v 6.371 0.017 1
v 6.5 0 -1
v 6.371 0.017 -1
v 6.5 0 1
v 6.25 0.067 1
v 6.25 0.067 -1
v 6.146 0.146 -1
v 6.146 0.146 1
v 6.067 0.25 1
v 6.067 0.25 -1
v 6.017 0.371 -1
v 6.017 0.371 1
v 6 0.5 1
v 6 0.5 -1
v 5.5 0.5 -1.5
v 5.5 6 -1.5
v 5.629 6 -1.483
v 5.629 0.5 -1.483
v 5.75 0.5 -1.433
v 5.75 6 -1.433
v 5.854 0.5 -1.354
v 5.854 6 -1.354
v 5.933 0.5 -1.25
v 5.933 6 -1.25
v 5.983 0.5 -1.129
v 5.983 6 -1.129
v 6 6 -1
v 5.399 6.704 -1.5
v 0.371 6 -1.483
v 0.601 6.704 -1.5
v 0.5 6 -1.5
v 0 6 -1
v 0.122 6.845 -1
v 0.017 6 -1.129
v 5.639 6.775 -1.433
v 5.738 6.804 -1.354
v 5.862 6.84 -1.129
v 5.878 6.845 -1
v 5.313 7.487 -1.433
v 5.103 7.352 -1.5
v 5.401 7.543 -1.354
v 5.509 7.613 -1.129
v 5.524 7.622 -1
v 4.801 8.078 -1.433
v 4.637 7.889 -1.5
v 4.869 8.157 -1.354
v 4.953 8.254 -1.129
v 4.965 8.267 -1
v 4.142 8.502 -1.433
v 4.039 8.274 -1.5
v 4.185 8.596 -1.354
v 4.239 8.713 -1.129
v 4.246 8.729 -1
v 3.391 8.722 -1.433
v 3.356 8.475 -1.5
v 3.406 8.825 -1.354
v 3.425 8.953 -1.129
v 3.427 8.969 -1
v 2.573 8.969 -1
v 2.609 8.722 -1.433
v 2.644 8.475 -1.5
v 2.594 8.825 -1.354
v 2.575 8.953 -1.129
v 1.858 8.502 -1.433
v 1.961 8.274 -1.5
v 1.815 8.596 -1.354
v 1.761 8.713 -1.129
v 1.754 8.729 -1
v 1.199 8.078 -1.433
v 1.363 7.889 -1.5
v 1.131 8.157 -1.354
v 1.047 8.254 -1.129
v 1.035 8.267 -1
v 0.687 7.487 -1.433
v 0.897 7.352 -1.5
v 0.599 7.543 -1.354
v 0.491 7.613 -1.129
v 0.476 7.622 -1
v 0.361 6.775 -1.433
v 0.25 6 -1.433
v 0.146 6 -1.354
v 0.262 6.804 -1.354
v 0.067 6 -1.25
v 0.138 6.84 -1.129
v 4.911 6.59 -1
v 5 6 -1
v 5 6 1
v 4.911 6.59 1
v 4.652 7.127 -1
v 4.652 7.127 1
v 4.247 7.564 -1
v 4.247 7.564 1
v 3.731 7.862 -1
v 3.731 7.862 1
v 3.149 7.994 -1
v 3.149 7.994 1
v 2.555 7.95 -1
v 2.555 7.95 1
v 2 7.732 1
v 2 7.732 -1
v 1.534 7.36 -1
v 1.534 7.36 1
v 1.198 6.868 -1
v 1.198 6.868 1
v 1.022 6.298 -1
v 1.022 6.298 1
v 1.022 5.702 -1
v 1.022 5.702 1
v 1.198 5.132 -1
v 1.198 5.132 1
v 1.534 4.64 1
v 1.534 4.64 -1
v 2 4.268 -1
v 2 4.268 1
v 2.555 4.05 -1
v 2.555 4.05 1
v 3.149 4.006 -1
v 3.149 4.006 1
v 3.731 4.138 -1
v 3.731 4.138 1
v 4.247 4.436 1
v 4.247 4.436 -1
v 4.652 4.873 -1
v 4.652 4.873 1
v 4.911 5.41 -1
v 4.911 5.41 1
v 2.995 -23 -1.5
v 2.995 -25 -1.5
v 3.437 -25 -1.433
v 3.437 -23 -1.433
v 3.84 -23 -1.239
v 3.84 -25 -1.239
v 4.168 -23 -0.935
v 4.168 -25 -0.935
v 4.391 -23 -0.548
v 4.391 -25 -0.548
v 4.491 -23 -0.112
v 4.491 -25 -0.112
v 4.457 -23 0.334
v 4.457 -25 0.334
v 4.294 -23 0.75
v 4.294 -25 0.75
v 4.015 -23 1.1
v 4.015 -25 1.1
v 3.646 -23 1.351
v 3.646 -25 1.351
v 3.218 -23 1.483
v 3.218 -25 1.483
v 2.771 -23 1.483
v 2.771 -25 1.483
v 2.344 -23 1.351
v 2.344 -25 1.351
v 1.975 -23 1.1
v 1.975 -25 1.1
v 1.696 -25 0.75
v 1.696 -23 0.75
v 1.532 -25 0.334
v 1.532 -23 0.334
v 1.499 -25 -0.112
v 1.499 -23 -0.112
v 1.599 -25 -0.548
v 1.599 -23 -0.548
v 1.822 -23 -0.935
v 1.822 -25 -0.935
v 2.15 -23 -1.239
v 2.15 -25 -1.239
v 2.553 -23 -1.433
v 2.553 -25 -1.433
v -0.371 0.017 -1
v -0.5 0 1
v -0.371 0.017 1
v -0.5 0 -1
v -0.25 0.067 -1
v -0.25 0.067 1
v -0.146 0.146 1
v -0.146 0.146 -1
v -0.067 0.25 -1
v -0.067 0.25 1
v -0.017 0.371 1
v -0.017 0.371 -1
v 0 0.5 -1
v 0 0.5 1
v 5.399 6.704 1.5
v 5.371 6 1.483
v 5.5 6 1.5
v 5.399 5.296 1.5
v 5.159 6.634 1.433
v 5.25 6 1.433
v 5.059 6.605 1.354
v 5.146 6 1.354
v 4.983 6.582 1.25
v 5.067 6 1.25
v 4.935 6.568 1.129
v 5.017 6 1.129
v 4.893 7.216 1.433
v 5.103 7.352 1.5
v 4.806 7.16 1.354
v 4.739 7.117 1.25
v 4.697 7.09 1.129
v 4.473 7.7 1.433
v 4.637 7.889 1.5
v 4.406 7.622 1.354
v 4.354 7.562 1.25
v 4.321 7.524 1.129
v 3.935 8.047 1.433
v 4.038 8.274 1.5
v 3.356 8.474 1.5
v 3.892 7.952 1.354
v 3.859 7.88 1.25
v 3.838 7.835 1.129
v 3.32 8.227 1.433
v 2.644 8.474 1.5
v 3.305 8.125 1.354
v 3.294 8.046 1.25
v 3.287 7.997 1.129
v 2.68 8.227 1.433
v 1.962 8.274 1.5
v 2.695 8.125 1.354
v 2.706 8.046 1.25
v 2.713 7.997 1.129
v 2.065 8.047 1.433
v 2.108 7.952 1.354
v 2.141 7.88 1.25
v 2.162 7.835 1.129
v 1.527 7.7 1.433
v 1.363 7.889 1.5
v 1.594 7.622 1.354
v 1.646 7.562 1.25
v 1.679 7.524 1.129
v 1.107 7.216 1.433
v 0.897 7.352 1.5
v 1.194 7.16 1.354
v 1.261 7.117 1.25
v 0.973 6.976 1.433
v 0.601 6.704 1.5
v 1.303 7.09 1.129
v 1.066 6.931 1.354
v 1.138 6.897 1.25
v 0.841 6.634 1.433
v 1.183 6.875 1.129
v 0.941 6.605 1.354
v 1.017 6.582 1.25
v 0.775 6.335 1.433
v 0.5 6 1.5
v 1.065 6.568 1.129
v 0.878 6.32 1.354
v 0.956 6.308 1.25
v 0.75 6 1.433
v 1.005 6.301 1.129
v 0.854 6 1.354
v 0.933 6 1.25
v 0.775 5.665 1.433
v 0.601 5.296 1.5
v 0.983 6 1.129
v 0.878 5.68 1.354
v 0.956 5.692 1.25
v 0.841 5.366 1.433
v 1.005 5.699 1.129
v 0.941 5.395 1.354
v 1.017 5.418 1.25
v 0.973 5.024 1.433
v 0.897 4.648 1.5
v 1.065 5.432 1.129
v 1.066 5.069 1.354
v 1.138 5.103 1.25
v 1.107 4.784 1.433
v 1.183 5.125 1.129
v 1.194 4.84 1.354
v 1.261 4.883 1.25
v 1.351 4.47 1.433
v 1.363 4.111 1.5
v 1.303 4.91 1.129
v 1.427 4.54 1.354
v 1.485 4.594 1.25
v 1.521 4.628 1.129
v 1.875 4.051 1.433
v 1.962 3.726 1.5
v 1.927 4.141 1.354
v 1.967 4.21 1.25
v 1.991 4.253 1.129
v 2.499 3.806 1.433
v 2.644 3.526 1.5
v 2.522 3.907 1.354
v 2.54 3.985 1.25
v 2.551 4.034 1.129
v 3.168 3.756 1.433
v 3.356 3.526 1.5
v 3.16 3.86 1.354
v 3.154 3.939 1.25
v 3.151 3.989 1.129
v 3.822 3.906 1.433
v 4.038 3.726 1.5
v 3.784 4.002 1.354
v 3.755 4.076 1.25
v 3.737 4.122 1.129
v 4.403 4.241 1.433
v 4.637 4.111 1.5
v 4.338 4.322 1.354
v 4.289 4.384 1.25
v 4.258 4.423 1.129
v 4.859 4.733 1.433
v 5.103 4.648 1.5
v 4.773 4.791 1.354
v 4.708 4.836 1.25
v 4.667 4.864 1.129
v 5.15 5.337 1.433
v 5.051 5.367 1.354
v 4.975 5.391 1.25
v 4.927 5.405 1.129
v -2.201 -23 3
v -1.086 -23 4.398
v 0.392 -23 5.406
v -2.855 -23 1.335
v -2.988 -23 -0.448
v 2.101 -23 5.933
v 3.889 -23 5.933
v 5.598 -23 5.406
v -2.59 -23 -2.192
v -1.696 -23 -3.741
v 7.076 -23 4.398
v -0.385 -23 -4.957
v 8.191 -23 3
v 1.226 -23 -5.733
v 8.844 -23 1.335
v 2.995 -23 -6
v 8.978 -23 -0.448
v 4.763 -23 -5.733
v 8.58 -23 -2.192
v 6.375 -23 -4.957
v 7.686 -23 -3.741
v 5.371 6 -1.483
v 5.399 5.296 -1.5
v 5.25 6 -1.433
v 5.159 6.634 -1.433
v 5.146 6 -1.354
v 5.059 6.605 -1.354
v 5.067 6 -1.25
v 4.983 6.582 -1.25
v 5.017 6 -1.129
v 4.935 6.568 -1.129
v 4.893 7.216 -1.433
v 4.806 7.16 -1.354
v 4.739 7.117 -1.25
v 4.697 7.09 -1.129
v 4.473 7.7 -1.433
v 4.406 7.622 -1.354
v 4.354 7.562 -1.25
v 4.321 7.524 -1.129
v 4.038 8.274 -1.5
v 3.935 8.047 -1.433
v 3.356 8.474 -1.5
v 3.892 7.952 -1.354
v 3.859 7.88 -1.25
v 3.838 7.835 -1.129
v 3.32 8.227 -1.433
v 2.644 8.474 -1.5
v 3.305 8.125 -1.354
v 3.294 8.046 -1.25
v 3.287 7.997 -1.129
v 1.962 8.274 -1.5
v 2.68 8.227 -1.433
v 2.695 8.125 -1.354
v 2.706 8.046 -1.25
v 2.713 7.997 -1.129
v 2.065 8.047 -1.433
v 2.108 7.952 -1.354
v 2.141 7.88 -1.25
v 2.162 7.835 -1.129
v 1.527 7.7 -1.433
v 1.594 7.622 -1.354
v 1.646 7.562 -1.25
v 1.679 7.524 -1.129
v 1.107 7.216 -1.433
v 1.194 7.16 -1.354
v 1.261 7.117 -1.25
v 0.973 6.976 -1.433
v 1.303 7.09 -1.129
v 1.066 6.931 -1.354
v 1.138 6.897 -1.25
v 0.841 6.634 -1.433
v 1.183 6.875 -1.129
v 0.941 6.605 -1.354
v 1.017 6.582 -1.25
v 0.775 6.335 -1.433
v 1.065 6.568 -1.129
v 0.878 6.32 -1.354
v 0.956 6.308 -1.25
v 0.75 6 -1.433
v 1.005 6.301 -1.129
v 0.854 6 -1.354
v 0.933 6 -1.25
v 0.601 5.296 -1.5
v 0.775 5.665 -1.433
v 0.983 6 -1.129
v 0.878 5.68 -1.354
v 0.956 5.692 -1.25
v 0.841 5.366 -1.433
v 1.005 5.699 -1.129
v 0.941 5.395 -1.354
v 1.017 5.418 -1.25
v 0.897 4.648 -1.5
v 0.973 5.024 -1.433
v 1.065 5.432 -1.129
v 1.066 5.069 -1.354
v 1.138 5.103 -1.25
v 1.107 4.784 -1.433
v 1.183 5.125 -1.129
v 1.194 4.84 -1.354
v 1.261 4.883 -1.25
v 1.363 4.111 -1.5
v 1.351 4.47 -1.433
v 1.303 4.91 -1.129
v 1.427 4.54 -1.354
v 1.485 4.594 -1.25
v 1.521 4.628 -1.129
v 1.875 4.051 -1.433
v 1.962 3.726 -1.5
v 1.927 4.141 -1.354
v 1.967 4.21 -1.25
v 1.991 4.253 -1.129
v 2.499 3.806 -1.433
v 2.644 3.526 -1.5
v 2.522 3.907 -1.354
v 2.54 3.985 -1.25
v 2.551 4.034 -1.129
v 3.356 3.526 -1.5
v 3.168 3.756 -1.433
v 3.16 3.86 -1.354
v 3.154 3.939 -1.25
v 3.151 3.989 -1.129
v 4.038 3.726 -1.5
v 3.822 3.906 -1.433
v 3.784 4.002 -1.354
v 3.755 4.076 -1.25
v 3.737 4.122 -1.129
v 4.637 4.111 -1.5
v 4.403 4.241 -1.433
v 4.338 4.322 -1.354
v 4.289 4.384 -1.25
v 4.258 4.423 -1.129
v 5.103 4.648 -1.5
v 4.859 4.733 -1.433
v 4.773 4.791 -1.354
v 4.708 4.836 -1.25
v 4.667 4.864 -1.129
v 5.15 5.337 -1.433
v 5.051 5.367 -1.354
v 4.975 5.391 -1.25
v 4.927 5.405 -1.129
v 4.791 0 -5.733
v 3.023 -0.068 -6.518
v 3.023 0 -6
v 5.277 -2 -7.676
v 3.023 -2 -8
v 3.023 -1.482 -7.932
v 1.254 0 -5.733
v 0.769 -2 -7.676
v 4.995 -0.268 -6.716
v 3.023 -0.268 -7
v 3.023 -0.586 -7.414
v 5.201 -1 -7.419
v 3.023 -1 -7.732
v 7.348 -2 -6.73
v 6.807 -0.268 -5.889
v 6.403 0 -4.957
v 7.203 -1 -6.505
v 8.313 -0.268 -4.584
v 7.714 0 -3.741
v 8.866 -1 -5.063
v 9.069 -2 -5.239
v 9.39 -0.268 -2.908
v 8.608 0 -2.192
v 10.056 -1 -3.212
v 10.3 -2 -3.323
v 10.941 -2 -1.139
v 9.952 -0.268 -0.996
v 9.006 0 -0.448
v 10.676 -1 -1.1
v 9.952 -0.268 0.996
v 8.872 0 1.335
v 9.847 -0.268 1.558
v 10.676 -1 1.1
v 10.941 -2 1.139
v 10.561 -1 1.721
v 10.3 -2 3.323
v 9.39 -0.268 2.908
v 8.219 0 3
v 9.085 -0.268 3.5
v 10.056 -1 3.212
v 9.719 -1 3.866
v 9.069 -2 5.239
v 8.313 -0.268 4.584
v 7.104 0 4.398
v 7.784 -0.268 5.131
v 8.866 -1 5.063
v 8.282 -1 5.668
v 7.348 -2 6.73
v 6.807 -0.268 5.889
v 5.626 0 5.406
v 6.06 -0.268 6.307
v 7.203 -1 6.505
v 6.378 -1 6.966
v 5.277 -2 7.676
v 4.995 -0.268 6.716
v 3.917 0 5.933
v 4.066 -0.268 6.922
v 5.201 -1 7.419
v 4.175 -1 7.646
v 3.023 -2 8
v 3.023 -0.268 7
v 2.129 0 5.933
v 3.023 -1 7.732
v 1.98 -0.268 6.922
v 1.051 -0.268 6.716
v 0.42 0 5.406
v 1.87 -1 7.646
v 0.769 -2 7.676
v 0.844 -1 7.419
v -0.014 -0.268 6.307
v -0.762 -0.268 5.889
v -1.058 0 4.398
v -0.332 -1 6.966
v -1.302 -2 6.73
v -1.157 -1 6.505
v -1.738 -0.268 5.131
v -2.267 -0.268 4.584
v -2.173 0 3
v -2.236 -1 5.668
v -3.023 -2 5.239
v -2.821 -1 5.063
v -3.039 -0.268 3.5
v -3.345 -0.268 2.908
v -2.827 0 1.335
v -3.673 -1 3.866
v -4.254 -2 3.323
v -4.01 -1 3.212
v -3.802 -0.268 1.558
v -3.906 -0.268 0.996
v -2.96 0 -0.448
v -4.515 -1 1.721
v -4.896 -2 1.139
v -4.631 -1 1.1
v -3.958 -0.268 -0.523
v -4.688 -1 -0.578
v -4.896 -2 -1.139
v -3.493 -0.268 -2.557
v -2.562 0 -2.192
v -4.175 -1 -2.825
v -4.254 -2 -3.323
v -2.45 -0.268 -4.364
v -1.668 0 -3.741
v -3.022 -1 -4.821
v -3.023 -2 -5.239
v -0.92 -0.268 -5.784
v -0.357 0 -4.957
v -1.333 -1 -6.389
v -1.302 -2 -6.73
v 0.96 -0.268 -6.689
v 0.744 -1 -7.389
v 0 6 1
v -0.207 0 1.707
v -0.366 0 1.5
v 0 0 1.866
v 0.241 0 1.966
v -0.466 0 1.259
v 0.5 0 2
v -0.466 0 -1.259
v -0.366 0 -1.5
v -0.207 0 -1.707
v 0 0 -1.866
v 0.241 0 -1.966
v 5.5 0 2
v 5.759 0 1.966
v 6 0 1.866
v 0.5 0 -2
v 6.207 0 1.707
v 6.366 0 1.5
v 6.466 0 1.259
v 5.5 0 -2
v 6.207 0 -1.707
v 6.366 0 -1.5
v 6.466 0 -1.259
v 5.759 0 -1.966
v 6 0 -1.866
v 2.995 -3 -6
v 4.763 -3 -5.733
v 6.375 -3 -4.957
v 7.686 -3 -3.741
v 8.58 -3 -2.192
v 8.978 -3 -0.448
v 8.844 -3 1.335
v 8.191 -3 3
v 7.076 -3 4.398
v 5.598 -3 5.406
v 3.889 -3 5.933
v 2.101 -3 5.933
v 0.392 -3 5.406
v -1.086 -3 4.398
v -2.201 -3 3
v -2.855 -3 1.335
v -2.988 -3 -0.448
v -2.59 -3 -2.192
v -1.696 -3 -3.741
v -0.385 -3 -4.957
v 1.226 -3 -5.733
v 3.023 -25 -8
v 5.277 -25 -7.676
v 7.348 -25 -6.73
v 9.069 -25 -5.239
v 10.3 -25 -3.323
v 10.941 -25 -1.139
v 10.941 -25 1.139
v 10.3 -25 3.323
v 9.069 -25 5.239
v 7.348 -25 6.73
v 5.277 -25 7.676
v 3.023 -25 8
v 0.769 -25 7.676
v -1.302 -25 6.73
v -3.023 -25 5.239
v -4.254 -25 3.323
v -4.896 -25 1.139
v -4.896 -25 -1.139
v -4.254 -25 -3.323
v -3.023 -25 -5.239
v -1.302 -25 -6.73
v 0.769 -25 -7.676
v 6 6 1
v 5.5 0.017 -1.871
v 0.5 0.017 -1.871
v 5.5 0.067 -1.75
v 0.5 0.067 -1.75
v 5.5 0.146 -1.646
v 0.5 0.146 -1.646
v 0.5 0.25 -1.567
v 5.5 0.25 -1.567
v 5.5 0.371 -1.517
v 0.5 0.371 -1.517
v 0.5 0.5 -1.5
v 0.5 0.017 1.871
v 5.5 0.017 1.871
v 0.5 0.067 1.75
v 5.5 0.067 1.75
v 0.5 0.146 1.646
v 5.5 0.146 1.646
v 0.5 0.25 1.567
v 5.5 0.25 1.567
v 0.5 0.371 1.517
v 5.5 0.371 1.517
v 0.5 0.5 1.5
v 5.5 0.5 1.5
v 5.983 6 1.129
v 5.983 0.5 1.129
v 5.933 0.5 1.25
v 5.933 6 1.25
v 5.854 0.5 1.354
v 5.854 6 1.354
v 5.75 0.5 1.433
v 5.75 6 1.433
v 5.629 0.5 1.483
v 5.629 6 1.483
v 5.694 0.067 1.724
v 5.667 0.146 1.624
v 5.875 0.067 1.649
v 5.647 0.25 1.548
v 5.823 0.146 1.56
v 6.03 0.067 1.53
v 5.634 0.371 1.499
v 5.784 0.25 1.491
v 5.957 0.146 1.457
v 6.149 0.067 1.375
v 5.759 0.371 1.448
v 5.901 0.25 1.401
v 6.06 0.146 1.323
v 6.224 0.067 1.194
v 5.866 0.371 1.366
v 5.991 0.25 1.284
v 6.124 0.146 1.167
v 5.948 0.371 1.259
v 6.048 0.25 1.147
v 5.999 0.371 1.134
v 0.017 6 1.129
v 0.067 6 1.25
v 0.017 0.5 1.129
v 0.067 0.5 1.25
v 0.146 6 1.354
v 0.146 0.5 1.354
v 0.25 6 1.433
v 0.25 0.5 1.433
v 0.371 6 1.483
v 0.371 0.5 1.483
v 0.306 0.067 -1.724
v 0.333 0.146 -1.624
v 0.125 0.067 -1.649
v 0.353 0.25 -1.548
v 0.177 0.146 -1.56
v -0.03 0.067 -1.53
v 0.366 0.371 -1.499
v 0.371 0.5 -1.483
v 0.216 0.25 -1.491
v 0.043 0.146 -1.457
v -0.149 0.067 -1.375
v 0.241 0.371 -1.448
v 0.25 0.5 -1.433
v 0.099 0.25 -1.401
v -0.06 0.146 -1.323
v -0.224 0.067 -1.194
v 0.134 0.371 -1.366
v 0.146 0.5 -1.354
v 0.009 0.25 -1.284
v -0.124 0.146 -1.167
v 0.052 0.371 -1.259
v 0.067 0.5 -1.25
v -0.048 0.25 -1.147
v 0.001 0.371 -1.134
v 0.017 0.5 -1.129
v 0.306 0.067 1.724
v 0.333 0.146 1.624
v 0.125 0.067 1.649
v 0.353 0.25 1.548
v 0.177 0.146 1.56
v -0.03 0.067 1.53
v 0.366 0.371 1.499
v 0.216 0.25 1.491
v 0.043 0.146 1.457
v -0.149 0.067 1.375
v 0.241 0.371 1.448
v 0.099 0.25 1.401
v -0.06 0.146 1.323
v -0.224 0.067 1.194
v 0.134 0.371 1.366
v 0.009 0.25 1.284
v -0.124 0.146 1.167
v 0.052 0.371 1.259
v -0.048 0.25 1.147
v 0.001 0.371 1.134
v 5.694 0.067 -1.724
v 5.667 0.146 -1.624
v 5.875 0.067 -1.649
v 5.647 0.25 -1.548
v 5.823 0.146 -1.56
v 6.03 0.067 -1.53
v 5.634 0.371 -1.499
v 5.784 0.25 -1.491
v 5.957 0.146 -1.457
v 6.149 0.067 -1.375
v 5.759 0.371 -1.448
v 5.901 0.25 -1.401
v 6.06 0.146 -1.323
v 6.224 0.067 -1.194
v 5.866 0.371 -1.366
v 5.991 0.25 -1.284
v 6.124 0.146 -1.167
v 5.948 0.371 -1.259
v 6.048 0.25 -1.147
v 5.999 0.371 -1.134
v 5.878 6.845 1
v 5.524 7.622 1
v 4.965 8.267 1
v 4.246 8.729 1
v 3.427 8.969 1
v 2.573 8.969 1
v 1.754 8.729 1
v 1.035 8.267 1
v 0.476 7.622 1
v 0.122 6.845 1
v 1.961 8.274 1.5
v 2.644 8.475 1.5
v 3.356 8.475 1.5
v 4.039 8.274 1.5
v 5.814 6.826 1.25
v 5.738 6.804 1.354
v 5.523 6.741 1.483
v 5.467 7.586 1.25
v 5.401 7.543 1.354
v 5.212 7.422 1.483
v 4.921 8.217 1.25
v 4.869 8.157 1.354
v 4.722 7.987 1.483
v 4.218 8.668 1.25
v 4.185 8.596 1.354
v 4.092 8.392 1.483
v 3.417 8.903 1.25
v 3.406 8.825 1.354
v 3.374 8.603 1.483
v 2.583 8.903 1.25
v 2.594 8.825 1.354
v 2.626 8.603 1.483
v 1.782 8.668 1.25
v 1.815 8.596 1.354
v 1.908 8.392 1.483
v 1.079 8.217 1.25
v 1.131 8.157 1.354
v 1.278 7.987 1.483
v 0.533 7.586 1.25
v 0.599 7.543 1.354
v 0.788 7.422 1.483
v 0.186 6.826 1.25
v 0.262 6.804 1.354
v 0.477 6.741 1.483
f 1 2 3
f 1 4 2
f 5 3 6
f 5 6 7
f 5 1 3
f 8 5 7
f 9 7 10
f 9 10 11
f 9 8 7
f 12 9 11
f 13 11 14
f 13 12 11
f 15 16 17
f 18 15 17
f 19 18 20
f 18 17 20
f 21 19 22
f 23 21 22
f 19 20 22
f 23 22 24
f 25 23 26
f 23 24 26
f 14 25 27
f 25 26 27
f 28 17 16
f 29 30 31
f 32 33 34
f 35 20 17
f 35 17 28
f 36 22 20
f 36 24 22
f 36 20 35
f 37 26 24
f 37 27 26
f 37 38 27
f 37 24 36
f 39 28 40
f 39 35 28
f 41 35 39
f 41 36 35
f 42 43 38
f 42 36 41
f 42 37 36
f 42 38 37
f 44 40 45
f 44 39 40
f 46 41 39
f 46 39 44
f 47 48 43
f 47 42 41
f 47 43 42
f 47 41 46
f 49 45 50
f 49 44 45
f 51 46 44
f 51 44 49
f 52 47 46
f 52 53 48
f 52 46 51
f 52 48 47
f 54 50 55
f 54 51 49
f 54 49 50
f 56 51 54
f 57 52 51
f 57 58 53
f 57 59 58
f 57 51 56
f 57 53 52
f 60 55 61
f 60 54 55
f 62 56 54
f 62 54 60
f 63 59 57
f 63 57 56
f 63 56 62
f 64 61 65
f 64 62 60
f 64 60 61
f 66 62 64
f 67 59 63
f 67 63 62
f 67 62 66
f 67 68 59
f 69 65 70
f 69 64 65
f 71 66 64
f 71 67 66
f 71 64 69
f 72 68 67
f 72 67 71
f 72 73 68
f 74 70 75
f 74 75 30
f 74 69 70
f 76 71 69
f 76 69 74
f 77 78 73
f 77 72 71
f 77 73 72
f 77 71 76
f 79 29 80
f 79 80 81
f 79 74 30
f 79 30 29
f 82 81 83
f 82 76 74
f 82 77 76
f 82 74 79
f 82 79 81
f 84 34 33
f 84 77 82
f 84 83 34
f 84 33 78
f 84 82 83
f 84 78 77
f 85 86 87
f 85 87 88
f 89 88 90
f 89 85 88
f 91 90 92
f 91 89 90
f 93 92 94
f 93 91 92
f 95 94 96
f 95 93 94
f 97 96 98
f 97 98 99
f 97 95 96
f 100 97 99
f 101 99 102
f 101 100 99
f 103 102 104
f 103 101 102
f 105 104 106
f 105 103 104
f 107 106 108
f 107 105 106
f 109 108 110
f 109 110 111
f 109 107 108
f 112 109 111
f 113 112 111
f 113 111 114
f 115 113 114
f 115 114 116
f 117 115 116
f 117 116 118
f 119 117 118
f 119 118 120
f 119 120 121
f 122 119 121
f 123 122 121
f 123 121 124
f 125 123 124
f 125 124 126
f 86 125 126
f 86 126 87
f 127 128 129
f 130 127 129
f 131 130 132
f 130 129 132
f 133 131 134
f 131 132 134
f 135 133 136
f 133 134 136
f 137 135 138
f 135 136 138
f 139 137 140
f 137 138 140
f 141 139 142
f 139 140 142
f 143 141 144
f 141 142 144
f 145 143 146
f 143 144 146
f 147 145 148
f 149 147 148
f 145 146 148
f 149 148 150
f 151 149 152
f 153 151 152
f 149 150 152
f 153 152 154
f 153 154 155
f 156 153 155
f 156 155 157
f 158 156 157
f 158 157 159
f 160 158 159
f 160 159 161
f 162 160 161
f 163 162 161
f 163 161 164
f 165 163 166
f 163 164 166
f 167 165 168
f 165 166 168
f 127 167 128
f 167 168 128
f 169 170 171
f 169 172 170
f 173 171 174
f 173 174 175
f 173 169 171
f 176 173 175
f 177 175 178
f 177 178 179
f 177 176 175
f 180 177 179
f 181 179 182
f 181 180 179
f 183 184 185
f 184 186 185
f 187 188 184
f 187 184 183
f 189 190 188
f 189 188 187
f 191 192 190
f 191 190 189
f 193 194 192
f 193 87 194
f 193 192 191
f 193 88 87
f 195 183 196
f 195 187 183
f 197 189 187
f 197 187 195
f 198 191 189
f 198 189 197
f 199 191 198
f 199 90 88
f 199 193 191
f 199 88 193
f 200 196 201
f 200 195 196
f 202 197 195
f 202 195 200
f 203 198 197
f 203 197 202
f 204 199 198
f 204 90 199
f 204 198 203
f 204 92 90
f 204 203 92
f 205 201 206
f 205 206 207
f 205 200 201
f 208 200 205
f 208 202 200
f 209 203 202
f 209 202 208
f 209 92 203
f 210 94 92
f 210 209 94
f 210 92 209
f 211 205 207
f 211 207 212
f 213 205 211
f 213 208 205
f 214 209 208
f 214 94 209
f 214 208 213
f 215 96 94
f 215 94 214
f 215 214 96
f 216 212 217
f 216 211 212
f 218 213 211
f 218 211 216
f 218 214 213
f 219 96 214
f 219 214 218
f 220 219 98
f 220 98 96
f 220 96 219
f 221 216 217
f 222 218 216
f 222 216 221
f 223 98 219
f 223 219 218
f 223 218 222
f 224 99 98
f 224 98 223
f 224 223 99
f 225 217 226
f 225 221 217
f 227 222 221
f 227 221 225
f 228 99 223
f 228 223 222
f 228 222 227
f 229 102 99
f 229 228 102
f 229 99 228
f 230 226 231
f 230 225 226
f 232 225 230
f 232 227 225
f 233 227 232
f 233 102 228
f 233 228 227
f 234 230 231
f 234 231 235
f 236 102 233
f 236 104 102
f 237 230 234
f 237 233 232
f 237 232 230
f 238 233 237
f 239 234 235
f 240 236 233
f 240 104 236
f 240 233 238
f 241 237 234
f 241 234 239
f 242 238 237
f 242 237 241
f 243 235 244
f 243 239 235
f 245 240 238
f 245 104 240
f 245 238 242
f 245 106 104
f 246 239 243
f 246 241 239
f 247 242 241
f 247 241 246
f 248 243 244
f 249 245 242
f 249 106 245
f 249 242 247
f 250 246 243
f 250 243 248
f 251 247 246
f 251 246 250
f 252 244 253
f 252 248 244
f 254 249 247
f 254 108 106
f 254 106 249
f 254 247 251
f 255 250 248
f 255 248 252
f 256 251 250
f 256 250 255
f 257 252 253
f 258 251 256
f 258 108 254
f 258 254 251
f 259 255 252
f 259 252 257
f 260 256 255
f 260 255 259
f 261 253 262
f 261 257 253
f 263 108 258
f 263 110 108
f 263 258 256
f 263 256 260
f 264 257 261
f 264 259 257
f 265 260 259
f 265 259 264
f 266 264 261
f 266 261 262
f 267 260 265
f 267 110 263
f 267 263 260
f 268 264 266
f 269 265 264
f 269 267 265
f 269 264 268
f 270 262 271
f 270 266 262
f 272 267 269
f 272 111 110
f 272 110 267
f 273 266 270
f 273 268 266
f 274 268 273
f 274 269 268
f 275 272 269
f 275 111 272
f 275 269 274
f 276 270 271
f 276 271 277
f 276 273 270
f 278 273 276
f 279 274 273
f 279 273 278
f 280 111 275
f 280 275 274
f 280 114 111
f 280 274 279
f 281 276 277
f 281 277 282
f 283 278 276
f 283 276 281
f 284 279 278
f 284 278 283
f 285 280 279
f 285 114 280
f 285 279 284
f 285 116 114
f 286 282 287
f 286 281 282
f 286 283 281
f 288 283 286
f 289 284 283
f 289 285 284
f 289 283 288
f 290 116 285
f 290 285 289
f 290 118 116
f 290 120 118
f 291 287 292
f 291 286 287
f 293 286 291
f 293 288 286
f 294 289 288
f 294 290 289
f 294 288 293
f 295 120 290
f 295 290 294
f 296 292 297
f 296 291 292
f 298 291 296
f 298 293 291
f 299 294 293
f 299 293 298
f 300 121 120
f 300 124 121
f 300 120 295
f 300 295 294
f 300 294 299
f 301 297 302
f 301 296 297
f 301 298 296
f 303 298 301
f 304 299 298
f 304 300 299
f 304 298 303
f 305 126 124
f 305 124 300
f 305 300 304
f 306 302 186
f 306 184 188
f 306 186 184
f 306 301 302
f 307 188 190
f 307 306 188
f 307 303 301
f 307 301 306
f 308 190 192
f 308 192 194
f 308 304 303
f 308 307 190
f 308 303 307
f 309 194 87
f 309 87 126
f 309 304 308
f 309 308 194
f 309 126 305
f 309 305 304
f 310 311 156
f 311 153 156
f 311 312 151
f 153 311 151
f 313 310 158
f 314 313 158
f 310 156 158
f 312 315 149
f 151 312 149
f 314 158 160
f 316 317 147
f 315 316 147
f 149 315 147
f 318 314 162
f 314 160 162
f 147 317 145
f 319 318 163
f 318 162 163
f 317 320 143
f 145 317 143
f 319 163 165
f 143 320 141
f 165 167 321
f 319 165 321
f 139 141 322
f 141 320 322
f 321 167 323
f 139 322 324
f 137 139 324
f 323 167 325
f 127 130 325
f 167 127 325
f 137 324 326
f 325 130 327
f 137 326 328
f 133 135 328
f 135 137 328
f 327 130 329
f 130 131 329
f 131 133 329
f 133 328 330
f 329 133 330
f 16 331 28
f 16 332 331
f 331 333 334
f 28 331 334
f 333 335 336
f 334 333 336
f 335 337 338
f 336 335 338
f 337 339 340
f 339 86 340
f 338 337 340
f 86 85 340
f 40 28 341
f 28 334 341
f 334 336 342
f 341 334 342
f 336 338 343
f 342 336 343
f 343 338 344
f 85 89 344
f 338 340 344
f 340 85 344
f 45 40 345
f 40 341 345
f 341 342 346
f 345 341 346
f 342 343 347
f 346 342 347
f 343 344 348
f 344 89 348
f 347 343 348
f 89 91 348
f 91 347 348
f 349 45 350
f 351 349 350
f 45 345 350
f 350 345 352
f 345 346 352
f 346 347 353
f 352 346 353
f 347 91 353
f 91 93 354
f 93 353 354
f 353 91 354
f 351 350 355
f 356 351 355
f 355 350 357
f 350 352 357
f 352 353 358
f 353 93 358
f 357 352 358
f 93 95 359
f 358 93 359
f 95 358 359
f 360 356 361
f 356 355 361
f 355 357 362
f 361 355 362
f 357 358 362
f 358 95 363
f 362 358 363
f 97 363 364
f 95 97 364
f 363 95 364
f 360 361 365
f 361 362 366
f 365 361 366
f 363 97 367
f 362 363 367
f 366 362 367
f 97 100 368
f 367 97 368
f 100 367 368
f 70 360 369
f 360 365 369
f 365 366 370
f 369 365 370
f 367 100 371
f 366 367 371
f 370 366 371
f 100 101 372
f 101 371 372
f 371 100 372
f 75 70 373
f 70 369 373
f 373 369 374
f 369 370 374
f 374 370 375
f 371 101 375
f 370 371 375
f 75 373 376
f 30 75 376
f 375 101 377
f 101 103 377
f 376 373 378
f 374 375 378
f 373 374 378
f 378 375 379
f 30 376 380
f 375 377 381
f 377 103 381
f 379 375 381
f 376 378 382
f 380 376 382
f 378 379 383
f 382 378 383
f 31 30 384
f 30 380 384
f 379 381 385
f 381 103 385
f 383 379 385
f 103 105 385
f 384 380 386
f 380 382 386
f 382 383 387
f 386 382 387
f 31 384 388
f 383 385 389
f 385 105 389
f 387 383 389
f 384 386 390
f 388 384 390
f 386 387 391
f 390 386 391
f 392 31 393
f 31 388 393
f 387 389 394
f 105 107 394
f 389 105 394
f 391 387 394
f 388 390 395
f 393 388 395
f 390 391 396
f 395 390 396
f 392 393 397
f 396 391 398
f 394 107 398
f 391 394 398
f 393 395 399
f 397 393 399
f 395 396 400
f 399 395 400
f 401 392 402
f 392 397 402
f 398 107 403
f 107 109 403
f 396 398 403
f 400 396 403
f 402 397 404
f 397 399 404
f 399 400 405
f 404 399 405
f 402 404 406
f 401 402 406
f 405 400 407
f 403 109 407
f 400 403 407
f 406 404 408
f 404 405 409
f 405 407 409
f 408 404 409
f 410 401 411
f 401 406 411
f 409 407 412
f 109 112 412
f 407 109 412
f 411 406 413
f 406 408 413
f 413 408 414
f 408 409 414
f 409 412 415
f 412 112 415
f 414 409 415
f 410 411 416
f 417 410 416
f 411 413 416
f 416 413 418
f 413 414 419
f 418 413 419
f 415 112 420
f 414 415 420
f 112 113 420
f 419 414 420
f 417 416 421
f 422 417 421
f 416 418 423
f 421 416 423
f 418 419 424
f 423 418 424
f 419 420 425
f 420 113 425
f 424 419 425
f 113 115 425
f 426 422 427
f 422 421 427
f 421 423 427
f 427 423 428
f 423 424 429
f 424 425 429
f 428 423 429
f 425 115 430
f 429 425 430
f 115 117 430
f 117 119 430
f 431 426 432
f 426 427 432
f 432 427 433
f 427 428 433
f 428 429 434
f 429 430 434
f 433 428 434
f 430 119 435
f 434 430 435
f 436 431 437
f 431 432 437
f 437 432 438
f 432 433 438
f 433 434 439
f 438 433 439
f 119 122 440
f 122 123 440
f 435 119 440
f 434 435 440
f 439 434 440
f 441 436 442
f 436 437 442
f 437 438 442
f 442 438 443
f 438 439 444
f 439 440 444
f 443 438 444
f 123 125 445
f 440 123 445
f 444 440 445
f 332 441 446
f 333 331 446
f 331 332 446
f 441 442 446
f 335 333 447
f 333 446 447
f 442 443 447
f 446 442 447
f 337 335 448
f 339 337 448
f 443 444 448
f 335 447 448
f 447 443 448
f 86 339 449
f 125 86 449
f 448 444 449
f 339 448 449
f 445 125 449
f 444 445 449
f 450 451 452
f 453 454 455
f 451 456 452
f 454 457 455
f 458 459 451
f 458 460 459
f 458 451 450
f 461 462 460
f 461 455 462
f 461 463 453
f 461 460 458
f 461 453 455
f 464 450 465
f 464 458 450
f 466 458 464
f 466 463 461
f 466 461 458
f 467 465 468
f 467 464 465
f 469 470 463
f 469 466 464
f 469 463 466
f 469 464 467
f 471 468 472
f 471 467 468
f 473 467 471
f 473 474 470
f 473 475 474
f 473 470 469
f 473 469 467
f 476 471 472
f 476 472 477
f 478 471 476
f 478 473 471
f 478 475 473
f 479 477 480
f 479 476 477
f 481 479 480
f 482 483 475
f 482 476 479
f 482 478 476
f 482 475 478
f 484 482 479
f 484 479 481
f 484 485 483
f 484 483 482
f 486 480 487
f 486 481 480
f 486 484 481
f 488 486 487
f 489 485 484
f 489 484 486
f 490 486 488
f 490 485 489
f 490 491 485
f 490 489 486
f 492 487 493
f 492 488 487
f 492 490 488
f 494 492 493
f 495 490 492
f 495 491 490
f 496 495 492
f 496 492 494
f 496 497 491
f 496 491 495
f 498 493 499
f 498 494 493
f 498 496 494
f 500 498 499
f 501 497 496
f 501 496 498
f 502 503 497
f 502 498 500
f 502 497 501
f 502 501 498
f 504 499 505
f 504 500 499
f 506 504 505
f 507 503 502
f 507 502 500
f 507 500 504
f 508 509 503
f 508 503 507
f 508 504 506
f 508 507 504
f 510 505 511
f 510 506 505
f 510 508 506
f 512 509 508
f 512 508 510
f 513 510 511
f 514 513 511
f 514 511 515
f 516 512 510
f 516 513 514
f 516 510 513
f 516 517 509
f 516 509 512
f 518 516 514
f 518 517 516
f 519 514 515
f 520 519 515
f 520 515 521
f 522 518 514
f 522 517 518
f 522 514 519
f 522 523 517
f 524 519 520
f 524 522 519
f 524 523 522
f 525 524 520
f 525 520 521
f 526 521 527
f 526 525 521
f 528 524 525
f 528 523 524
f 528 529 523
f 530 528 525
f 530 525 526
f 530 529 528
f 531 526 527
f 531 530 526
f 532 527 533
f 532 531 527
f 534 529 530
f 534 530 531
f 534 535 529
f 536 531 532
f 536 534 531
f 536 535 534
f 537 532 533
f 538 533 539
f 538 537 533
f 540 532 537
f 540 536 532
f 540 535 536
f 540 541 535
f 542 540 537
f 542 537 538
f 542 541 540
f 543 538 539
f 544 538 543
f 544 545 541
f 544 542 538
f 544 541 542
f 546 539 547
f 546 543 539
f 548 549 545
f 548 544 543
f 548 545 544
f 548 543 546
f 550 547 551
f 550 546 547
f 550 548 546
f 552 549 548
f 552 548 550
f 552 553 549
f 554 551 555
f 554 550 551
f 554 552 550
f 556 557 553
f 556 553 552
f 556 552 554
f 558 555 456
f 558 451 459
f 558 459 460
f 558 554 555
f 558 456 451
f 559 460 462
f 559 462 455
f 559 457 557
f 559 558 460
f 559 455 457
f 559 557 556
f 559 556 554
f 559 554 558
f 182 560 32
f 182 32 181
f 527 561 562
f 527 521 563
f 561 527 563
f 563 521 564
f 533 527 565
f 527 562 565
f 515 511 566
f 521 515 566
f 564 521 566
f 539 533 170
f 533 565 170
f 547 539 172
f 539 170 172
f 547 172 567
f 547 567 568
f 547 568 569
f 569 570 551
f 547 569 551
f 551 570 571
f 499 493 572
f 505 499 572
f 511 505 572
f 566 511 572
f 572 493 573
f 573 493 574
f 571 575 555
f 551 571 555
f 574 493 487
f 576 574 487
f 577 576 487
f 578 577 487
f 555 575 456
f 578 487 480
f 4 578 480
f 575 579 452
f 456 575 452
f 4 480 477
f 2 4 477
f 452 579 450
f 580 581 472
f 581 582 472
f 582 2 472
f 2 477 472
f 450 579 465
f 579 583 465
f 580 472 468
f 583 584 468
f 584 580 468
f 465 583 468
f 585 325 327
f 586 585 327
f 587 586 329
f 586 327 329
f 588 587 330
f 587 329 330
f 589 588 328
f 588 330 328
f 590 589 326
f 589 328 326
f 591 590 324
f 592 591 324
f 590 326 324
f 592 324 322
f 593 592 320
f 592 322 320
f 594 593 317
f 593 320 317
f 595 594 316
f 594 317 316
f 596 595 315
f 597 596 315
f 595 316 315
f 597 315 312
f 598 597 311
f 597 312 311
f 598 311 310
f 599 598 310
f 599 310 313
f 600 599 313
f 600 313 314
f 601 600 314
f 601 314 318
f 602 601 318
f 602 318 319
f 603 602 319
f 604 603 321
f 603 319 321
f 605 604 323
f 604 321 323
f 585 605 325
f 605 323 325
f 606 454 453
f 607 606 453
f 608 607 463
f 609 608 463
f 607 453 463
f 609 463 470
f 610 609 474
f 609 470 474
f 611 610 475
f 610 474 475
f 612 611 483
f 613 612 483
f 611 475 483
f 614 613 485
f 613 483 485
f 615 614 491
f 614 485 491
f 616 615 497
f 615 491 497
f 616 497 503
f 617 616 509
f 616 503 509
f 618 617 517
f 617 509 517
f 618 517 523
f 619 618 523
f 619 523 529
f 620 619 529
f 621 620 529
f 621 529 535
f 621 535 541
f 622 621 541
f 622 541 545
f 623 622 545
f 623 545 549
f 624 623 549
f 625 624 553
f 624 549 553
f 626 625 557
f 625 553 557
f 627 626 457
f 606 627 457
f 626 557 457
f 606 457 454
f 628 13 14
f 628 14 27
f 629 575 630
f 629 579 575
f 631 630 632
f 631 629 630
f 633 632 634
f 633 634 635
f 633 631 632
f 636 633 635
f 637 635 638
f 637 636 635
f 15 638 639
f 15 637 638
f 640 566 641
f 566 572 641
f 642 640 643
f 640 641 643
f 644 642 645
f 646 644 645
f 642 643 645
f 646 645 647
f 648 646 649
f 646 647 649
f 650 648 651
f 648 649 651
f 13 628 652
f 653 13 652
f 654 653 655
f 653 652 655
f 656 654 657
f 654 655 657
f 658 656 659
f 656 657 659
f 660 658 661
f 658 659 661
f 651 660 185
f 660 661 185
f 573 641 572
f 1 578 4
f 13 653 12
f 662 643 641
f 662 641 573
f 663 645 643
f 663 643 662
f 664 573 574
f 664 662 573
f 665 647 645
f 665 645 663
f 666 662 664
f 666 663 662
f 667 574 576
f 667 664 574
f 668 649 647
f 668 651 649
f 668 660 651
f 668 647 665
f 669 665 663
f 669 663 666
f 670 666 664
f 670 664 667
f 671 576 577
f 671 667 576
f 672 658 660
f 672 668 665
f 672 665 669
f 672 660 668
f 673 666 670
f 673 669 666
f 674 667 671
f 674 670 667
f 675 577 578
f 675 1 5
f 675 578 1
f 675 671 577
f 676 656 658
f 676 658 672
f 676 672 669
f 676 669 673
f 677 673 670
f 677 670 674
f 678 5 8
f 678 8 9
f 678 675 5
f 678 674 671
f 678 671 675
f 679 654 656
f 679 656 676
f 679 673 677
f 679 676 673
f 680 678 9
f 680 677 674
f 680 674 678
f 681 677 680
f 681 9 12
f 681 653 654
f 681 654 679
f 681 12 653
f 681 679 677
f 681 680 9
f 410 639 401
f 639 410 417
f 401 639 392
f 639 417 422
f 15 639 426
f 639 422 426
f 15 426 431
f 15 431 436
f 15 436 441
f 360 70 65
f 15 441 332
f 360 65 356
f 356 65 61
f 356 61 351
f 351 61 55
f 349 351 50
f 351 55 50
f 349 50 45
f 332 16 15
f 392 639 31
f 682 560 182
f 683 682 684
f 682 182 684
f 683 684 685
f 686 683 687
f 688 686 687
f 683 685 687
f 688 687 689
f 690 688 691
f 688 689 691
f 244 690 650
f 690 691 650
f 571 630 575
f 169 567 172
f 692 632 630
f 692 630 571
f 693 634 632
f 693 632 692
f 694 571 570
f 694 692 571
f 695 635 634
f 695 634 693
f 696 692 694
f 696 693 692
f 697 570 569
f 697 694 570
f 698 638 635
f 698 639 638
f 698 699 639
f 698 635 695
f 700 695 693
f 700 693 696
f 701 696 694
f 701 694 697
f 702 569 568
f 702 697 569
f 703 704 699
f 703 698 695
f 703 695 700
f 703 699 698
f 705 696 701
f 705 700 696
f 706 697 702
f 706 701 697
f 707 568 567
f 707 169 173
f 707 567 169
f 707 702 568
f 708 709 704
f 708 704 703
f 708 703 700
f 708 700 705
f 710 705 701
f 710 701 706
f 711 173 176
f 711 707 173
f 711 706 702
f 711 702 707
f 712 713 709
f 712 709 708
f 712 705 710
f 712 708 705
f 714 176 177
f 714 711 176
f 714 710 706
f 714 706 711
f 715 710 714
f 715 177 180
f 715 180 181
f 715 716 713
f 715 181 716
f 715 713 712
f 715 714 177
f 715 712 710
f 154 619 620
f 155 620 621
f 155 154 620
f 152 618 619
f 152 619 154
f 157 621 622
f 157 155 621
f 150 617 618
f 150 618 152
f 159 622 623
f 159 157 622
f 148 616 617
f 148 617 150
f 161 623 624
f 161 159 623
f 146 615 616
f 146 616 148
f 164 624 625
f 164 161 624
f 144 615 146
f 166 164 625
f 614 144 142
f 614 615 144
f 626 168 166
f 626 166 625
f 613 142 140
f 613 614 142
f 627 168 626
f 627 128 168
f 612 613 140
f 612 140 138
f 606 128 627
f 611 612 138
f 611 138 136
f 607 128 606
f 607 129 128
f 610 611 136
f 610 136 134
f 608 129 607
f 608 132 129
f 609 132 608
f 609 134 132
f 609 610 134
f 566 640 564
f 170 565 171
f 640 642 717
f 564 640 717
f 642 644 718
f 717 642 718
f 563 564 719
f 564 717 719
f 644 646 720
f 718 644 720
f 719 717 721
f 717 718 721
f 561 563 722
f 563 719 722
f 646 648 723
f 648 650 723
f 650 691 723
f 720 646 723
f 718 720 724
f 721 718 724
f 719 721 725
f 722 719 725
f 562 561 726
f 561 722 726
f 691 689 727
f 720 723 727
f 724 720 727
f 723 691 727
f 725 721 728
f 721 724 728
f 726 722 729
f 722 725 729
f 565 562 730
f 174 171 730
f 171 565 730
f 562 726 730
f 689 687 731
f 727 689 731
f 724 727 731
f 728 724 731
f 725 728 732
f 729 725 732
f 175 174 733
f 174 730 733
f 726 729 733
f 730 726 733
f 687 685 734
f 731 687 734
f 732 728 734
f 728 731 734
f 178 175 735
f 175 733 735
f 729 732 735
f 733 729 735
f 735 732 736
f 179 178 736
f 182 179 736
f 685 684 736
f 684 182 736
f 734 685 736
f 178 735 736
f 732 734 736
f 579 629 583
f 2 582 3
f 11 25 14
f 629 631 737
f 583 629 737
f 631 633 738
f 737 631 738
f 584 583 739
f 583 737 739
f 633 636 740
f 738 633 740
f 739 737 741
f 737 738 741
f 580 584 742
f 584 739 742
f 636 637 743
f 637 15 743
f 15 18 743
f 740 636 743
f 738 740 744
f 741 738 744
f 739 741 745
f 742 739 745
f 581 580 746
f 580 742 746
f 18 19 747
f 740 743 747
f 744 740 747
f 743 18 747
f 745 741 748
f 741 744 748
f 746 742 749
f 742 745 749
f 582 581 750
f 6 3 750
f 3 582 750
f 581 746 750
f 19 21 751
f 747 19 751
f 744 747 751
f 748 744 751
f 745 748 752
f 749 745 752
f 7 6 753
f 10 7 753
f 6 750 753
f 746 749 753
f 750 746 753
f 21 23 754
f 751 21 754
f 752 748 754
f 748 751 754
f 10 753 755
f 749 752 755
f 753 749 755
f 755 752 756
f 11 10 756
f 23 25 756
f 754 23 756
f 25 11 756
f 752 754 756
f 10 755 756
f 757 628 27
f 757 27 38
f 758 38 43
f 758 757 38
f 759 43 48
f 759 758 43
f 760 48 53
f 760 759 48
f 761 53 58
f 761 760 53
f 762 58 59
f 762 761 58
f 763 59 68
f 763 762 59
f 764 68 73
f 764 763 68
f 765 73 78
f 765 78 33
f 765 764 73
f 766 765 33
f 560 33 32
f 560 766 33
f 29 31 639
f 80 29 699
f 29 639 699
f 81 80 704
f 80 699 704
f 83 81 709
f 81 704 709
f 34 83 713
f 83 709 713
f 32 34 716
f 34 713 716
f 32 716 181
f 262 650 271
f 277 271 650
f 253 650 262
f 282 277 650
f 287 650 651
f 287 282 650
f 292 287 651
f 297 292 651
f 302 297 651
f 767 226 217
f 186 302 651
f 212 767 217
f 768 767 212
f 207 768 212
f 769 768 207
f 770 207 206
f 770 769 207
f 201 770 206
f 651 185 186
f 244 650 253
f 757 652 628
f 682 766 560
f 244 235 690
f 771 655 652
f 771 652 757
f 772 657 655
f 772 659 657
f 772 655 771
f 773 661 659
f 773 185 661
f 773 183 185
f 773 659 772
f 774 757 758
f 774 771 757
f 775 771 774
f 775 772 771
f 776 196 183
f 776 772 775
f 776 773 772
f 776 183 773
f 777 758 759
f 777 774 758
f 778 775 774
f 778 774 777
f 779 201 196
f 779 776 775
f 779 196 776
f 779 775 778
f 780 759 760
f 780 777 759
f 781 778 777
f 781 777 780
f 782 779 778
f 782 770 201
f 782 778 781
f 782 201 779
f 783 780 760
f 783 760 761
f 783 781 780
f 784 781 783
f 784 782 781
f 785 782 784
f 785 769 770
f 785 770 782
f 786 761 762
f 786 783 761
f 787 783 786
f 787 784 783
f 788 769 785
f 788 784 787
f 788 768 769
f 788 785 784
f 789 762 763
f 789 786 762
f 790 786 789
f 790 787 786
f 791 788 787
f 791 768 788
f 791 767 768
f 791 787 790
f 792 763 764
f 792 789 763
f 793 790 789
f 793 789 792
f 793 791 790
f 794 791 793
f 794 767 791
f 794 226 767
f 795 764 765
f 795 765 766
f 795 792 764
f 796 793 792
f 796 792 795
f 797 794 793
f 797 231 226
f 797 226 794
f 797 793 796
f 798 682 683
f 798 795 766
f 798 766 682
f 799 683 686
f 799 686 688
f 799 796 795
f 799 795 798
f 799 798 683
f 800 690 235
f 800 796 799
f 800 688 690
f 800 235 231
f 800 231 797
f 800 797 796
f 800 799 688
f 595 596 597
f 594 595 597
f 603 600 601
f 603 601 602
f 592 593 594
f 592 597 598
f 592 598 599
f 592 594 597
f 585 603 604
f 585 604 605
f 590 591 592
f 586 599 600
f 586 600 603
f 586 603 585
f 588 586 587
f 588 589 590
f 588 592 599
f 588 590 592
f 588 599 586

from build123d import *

# Parameters (mm, degrees)
SKETCH_1_R          = 2
EXTRUDE_1_DEPTH     = 1.5
SKETCH_2_R          = 8
EXTRUDE_2_DEPTH     = 25
SKETCH_3_R          = 1.5
CUT_EXTRUDE_1_DEPTH = 2
SKETCH_4_R          = 6
CUT_EXTRUDE_2_DEPTH = 20
FILLET_5_R          = 0.5
FILLET_6_R          = 2


with BuildPart() as part:
    # 草图1 → 凸台-拉伸1 (new, symmetric)
    with BuildSketch(Plane.XY):
        with BuildLine():
            Line((0, 0), (6, 0))
            Line((6, 0), (6, 6))
            ThreePointArc((6, 6), (3, 9), (0, 6))
            Line((0, 6), (0, 0))
        make_face()
        with Locations((3, 6)):
            Circle(SKETCH_1_R, mode=Mode.SUBTRACT)
    extrude(amount=EXTRUDE_1_DEPTH, both=True)

    # 草图2 → 凸台-拉伸2 (add)
    with BuildSketch(Plane.XZ):
        with Locations(Location((3.022849102, 0, 0), (0, 0, 270))):
            Circle(SKETCH_2_R)
    extrude(amount=EXTRUDE_2_DEPTH)

    # 草图3 → 切除-拉伸1 (cut)
    with BuildSketch(Plane.XZ.offset(25)):
        with Locations(Location((2.994848376, 0, 0), (0, 0, 270))):
            Circle(SKETCH_3_R)
    extrude(amount=-CUT_EXTRUDE_1_DEPTH, mode=Mode.SUBTRACT)

    # 草图4 → 切除-拉伸2 (cut)
    with BuildSketch(Plane.XZ.offset(23)):
        with Locations(Location((2.994848376, 0, 0), (0, 0, 270))):
            Circle(SKETCH_4_R)
    extrude(amount=-CUT_EXTRUDE_2_DEPTH, mode=Mode.SUBTRACT)

    # 圆角5
    fillet_5_edges = [part.edges().sort_by_distance(p)[0] for p in [
        (6, 3, 1.5),
        (1, 6, -1.5),
        (1, 6, 1.5),
        (3, 9, 1.5),
        (0, 3, 1.5),
        (3, 9, -1.5),
        (6, 3, -1.5),
        (3, 0, -1.5),
        (0, 3, -1.5),
        (3, 0, 1.5),
        (6, 0, 0),
        (0, 0, 0),
    ]]
    fillet(fillet_5_edges, radius=FILLET_5_R - 0.0001)  # a hair under: the kernel refuses the full size

    # 圆角6
    fillet_6_edges = [part.edges().sort_by_distance(p)[0] for p in [
        (3.022849102, 0, 8),
    ]]
    fillet(fillet_6_edges, radius=FILLET_6_R)


solid = part.part
